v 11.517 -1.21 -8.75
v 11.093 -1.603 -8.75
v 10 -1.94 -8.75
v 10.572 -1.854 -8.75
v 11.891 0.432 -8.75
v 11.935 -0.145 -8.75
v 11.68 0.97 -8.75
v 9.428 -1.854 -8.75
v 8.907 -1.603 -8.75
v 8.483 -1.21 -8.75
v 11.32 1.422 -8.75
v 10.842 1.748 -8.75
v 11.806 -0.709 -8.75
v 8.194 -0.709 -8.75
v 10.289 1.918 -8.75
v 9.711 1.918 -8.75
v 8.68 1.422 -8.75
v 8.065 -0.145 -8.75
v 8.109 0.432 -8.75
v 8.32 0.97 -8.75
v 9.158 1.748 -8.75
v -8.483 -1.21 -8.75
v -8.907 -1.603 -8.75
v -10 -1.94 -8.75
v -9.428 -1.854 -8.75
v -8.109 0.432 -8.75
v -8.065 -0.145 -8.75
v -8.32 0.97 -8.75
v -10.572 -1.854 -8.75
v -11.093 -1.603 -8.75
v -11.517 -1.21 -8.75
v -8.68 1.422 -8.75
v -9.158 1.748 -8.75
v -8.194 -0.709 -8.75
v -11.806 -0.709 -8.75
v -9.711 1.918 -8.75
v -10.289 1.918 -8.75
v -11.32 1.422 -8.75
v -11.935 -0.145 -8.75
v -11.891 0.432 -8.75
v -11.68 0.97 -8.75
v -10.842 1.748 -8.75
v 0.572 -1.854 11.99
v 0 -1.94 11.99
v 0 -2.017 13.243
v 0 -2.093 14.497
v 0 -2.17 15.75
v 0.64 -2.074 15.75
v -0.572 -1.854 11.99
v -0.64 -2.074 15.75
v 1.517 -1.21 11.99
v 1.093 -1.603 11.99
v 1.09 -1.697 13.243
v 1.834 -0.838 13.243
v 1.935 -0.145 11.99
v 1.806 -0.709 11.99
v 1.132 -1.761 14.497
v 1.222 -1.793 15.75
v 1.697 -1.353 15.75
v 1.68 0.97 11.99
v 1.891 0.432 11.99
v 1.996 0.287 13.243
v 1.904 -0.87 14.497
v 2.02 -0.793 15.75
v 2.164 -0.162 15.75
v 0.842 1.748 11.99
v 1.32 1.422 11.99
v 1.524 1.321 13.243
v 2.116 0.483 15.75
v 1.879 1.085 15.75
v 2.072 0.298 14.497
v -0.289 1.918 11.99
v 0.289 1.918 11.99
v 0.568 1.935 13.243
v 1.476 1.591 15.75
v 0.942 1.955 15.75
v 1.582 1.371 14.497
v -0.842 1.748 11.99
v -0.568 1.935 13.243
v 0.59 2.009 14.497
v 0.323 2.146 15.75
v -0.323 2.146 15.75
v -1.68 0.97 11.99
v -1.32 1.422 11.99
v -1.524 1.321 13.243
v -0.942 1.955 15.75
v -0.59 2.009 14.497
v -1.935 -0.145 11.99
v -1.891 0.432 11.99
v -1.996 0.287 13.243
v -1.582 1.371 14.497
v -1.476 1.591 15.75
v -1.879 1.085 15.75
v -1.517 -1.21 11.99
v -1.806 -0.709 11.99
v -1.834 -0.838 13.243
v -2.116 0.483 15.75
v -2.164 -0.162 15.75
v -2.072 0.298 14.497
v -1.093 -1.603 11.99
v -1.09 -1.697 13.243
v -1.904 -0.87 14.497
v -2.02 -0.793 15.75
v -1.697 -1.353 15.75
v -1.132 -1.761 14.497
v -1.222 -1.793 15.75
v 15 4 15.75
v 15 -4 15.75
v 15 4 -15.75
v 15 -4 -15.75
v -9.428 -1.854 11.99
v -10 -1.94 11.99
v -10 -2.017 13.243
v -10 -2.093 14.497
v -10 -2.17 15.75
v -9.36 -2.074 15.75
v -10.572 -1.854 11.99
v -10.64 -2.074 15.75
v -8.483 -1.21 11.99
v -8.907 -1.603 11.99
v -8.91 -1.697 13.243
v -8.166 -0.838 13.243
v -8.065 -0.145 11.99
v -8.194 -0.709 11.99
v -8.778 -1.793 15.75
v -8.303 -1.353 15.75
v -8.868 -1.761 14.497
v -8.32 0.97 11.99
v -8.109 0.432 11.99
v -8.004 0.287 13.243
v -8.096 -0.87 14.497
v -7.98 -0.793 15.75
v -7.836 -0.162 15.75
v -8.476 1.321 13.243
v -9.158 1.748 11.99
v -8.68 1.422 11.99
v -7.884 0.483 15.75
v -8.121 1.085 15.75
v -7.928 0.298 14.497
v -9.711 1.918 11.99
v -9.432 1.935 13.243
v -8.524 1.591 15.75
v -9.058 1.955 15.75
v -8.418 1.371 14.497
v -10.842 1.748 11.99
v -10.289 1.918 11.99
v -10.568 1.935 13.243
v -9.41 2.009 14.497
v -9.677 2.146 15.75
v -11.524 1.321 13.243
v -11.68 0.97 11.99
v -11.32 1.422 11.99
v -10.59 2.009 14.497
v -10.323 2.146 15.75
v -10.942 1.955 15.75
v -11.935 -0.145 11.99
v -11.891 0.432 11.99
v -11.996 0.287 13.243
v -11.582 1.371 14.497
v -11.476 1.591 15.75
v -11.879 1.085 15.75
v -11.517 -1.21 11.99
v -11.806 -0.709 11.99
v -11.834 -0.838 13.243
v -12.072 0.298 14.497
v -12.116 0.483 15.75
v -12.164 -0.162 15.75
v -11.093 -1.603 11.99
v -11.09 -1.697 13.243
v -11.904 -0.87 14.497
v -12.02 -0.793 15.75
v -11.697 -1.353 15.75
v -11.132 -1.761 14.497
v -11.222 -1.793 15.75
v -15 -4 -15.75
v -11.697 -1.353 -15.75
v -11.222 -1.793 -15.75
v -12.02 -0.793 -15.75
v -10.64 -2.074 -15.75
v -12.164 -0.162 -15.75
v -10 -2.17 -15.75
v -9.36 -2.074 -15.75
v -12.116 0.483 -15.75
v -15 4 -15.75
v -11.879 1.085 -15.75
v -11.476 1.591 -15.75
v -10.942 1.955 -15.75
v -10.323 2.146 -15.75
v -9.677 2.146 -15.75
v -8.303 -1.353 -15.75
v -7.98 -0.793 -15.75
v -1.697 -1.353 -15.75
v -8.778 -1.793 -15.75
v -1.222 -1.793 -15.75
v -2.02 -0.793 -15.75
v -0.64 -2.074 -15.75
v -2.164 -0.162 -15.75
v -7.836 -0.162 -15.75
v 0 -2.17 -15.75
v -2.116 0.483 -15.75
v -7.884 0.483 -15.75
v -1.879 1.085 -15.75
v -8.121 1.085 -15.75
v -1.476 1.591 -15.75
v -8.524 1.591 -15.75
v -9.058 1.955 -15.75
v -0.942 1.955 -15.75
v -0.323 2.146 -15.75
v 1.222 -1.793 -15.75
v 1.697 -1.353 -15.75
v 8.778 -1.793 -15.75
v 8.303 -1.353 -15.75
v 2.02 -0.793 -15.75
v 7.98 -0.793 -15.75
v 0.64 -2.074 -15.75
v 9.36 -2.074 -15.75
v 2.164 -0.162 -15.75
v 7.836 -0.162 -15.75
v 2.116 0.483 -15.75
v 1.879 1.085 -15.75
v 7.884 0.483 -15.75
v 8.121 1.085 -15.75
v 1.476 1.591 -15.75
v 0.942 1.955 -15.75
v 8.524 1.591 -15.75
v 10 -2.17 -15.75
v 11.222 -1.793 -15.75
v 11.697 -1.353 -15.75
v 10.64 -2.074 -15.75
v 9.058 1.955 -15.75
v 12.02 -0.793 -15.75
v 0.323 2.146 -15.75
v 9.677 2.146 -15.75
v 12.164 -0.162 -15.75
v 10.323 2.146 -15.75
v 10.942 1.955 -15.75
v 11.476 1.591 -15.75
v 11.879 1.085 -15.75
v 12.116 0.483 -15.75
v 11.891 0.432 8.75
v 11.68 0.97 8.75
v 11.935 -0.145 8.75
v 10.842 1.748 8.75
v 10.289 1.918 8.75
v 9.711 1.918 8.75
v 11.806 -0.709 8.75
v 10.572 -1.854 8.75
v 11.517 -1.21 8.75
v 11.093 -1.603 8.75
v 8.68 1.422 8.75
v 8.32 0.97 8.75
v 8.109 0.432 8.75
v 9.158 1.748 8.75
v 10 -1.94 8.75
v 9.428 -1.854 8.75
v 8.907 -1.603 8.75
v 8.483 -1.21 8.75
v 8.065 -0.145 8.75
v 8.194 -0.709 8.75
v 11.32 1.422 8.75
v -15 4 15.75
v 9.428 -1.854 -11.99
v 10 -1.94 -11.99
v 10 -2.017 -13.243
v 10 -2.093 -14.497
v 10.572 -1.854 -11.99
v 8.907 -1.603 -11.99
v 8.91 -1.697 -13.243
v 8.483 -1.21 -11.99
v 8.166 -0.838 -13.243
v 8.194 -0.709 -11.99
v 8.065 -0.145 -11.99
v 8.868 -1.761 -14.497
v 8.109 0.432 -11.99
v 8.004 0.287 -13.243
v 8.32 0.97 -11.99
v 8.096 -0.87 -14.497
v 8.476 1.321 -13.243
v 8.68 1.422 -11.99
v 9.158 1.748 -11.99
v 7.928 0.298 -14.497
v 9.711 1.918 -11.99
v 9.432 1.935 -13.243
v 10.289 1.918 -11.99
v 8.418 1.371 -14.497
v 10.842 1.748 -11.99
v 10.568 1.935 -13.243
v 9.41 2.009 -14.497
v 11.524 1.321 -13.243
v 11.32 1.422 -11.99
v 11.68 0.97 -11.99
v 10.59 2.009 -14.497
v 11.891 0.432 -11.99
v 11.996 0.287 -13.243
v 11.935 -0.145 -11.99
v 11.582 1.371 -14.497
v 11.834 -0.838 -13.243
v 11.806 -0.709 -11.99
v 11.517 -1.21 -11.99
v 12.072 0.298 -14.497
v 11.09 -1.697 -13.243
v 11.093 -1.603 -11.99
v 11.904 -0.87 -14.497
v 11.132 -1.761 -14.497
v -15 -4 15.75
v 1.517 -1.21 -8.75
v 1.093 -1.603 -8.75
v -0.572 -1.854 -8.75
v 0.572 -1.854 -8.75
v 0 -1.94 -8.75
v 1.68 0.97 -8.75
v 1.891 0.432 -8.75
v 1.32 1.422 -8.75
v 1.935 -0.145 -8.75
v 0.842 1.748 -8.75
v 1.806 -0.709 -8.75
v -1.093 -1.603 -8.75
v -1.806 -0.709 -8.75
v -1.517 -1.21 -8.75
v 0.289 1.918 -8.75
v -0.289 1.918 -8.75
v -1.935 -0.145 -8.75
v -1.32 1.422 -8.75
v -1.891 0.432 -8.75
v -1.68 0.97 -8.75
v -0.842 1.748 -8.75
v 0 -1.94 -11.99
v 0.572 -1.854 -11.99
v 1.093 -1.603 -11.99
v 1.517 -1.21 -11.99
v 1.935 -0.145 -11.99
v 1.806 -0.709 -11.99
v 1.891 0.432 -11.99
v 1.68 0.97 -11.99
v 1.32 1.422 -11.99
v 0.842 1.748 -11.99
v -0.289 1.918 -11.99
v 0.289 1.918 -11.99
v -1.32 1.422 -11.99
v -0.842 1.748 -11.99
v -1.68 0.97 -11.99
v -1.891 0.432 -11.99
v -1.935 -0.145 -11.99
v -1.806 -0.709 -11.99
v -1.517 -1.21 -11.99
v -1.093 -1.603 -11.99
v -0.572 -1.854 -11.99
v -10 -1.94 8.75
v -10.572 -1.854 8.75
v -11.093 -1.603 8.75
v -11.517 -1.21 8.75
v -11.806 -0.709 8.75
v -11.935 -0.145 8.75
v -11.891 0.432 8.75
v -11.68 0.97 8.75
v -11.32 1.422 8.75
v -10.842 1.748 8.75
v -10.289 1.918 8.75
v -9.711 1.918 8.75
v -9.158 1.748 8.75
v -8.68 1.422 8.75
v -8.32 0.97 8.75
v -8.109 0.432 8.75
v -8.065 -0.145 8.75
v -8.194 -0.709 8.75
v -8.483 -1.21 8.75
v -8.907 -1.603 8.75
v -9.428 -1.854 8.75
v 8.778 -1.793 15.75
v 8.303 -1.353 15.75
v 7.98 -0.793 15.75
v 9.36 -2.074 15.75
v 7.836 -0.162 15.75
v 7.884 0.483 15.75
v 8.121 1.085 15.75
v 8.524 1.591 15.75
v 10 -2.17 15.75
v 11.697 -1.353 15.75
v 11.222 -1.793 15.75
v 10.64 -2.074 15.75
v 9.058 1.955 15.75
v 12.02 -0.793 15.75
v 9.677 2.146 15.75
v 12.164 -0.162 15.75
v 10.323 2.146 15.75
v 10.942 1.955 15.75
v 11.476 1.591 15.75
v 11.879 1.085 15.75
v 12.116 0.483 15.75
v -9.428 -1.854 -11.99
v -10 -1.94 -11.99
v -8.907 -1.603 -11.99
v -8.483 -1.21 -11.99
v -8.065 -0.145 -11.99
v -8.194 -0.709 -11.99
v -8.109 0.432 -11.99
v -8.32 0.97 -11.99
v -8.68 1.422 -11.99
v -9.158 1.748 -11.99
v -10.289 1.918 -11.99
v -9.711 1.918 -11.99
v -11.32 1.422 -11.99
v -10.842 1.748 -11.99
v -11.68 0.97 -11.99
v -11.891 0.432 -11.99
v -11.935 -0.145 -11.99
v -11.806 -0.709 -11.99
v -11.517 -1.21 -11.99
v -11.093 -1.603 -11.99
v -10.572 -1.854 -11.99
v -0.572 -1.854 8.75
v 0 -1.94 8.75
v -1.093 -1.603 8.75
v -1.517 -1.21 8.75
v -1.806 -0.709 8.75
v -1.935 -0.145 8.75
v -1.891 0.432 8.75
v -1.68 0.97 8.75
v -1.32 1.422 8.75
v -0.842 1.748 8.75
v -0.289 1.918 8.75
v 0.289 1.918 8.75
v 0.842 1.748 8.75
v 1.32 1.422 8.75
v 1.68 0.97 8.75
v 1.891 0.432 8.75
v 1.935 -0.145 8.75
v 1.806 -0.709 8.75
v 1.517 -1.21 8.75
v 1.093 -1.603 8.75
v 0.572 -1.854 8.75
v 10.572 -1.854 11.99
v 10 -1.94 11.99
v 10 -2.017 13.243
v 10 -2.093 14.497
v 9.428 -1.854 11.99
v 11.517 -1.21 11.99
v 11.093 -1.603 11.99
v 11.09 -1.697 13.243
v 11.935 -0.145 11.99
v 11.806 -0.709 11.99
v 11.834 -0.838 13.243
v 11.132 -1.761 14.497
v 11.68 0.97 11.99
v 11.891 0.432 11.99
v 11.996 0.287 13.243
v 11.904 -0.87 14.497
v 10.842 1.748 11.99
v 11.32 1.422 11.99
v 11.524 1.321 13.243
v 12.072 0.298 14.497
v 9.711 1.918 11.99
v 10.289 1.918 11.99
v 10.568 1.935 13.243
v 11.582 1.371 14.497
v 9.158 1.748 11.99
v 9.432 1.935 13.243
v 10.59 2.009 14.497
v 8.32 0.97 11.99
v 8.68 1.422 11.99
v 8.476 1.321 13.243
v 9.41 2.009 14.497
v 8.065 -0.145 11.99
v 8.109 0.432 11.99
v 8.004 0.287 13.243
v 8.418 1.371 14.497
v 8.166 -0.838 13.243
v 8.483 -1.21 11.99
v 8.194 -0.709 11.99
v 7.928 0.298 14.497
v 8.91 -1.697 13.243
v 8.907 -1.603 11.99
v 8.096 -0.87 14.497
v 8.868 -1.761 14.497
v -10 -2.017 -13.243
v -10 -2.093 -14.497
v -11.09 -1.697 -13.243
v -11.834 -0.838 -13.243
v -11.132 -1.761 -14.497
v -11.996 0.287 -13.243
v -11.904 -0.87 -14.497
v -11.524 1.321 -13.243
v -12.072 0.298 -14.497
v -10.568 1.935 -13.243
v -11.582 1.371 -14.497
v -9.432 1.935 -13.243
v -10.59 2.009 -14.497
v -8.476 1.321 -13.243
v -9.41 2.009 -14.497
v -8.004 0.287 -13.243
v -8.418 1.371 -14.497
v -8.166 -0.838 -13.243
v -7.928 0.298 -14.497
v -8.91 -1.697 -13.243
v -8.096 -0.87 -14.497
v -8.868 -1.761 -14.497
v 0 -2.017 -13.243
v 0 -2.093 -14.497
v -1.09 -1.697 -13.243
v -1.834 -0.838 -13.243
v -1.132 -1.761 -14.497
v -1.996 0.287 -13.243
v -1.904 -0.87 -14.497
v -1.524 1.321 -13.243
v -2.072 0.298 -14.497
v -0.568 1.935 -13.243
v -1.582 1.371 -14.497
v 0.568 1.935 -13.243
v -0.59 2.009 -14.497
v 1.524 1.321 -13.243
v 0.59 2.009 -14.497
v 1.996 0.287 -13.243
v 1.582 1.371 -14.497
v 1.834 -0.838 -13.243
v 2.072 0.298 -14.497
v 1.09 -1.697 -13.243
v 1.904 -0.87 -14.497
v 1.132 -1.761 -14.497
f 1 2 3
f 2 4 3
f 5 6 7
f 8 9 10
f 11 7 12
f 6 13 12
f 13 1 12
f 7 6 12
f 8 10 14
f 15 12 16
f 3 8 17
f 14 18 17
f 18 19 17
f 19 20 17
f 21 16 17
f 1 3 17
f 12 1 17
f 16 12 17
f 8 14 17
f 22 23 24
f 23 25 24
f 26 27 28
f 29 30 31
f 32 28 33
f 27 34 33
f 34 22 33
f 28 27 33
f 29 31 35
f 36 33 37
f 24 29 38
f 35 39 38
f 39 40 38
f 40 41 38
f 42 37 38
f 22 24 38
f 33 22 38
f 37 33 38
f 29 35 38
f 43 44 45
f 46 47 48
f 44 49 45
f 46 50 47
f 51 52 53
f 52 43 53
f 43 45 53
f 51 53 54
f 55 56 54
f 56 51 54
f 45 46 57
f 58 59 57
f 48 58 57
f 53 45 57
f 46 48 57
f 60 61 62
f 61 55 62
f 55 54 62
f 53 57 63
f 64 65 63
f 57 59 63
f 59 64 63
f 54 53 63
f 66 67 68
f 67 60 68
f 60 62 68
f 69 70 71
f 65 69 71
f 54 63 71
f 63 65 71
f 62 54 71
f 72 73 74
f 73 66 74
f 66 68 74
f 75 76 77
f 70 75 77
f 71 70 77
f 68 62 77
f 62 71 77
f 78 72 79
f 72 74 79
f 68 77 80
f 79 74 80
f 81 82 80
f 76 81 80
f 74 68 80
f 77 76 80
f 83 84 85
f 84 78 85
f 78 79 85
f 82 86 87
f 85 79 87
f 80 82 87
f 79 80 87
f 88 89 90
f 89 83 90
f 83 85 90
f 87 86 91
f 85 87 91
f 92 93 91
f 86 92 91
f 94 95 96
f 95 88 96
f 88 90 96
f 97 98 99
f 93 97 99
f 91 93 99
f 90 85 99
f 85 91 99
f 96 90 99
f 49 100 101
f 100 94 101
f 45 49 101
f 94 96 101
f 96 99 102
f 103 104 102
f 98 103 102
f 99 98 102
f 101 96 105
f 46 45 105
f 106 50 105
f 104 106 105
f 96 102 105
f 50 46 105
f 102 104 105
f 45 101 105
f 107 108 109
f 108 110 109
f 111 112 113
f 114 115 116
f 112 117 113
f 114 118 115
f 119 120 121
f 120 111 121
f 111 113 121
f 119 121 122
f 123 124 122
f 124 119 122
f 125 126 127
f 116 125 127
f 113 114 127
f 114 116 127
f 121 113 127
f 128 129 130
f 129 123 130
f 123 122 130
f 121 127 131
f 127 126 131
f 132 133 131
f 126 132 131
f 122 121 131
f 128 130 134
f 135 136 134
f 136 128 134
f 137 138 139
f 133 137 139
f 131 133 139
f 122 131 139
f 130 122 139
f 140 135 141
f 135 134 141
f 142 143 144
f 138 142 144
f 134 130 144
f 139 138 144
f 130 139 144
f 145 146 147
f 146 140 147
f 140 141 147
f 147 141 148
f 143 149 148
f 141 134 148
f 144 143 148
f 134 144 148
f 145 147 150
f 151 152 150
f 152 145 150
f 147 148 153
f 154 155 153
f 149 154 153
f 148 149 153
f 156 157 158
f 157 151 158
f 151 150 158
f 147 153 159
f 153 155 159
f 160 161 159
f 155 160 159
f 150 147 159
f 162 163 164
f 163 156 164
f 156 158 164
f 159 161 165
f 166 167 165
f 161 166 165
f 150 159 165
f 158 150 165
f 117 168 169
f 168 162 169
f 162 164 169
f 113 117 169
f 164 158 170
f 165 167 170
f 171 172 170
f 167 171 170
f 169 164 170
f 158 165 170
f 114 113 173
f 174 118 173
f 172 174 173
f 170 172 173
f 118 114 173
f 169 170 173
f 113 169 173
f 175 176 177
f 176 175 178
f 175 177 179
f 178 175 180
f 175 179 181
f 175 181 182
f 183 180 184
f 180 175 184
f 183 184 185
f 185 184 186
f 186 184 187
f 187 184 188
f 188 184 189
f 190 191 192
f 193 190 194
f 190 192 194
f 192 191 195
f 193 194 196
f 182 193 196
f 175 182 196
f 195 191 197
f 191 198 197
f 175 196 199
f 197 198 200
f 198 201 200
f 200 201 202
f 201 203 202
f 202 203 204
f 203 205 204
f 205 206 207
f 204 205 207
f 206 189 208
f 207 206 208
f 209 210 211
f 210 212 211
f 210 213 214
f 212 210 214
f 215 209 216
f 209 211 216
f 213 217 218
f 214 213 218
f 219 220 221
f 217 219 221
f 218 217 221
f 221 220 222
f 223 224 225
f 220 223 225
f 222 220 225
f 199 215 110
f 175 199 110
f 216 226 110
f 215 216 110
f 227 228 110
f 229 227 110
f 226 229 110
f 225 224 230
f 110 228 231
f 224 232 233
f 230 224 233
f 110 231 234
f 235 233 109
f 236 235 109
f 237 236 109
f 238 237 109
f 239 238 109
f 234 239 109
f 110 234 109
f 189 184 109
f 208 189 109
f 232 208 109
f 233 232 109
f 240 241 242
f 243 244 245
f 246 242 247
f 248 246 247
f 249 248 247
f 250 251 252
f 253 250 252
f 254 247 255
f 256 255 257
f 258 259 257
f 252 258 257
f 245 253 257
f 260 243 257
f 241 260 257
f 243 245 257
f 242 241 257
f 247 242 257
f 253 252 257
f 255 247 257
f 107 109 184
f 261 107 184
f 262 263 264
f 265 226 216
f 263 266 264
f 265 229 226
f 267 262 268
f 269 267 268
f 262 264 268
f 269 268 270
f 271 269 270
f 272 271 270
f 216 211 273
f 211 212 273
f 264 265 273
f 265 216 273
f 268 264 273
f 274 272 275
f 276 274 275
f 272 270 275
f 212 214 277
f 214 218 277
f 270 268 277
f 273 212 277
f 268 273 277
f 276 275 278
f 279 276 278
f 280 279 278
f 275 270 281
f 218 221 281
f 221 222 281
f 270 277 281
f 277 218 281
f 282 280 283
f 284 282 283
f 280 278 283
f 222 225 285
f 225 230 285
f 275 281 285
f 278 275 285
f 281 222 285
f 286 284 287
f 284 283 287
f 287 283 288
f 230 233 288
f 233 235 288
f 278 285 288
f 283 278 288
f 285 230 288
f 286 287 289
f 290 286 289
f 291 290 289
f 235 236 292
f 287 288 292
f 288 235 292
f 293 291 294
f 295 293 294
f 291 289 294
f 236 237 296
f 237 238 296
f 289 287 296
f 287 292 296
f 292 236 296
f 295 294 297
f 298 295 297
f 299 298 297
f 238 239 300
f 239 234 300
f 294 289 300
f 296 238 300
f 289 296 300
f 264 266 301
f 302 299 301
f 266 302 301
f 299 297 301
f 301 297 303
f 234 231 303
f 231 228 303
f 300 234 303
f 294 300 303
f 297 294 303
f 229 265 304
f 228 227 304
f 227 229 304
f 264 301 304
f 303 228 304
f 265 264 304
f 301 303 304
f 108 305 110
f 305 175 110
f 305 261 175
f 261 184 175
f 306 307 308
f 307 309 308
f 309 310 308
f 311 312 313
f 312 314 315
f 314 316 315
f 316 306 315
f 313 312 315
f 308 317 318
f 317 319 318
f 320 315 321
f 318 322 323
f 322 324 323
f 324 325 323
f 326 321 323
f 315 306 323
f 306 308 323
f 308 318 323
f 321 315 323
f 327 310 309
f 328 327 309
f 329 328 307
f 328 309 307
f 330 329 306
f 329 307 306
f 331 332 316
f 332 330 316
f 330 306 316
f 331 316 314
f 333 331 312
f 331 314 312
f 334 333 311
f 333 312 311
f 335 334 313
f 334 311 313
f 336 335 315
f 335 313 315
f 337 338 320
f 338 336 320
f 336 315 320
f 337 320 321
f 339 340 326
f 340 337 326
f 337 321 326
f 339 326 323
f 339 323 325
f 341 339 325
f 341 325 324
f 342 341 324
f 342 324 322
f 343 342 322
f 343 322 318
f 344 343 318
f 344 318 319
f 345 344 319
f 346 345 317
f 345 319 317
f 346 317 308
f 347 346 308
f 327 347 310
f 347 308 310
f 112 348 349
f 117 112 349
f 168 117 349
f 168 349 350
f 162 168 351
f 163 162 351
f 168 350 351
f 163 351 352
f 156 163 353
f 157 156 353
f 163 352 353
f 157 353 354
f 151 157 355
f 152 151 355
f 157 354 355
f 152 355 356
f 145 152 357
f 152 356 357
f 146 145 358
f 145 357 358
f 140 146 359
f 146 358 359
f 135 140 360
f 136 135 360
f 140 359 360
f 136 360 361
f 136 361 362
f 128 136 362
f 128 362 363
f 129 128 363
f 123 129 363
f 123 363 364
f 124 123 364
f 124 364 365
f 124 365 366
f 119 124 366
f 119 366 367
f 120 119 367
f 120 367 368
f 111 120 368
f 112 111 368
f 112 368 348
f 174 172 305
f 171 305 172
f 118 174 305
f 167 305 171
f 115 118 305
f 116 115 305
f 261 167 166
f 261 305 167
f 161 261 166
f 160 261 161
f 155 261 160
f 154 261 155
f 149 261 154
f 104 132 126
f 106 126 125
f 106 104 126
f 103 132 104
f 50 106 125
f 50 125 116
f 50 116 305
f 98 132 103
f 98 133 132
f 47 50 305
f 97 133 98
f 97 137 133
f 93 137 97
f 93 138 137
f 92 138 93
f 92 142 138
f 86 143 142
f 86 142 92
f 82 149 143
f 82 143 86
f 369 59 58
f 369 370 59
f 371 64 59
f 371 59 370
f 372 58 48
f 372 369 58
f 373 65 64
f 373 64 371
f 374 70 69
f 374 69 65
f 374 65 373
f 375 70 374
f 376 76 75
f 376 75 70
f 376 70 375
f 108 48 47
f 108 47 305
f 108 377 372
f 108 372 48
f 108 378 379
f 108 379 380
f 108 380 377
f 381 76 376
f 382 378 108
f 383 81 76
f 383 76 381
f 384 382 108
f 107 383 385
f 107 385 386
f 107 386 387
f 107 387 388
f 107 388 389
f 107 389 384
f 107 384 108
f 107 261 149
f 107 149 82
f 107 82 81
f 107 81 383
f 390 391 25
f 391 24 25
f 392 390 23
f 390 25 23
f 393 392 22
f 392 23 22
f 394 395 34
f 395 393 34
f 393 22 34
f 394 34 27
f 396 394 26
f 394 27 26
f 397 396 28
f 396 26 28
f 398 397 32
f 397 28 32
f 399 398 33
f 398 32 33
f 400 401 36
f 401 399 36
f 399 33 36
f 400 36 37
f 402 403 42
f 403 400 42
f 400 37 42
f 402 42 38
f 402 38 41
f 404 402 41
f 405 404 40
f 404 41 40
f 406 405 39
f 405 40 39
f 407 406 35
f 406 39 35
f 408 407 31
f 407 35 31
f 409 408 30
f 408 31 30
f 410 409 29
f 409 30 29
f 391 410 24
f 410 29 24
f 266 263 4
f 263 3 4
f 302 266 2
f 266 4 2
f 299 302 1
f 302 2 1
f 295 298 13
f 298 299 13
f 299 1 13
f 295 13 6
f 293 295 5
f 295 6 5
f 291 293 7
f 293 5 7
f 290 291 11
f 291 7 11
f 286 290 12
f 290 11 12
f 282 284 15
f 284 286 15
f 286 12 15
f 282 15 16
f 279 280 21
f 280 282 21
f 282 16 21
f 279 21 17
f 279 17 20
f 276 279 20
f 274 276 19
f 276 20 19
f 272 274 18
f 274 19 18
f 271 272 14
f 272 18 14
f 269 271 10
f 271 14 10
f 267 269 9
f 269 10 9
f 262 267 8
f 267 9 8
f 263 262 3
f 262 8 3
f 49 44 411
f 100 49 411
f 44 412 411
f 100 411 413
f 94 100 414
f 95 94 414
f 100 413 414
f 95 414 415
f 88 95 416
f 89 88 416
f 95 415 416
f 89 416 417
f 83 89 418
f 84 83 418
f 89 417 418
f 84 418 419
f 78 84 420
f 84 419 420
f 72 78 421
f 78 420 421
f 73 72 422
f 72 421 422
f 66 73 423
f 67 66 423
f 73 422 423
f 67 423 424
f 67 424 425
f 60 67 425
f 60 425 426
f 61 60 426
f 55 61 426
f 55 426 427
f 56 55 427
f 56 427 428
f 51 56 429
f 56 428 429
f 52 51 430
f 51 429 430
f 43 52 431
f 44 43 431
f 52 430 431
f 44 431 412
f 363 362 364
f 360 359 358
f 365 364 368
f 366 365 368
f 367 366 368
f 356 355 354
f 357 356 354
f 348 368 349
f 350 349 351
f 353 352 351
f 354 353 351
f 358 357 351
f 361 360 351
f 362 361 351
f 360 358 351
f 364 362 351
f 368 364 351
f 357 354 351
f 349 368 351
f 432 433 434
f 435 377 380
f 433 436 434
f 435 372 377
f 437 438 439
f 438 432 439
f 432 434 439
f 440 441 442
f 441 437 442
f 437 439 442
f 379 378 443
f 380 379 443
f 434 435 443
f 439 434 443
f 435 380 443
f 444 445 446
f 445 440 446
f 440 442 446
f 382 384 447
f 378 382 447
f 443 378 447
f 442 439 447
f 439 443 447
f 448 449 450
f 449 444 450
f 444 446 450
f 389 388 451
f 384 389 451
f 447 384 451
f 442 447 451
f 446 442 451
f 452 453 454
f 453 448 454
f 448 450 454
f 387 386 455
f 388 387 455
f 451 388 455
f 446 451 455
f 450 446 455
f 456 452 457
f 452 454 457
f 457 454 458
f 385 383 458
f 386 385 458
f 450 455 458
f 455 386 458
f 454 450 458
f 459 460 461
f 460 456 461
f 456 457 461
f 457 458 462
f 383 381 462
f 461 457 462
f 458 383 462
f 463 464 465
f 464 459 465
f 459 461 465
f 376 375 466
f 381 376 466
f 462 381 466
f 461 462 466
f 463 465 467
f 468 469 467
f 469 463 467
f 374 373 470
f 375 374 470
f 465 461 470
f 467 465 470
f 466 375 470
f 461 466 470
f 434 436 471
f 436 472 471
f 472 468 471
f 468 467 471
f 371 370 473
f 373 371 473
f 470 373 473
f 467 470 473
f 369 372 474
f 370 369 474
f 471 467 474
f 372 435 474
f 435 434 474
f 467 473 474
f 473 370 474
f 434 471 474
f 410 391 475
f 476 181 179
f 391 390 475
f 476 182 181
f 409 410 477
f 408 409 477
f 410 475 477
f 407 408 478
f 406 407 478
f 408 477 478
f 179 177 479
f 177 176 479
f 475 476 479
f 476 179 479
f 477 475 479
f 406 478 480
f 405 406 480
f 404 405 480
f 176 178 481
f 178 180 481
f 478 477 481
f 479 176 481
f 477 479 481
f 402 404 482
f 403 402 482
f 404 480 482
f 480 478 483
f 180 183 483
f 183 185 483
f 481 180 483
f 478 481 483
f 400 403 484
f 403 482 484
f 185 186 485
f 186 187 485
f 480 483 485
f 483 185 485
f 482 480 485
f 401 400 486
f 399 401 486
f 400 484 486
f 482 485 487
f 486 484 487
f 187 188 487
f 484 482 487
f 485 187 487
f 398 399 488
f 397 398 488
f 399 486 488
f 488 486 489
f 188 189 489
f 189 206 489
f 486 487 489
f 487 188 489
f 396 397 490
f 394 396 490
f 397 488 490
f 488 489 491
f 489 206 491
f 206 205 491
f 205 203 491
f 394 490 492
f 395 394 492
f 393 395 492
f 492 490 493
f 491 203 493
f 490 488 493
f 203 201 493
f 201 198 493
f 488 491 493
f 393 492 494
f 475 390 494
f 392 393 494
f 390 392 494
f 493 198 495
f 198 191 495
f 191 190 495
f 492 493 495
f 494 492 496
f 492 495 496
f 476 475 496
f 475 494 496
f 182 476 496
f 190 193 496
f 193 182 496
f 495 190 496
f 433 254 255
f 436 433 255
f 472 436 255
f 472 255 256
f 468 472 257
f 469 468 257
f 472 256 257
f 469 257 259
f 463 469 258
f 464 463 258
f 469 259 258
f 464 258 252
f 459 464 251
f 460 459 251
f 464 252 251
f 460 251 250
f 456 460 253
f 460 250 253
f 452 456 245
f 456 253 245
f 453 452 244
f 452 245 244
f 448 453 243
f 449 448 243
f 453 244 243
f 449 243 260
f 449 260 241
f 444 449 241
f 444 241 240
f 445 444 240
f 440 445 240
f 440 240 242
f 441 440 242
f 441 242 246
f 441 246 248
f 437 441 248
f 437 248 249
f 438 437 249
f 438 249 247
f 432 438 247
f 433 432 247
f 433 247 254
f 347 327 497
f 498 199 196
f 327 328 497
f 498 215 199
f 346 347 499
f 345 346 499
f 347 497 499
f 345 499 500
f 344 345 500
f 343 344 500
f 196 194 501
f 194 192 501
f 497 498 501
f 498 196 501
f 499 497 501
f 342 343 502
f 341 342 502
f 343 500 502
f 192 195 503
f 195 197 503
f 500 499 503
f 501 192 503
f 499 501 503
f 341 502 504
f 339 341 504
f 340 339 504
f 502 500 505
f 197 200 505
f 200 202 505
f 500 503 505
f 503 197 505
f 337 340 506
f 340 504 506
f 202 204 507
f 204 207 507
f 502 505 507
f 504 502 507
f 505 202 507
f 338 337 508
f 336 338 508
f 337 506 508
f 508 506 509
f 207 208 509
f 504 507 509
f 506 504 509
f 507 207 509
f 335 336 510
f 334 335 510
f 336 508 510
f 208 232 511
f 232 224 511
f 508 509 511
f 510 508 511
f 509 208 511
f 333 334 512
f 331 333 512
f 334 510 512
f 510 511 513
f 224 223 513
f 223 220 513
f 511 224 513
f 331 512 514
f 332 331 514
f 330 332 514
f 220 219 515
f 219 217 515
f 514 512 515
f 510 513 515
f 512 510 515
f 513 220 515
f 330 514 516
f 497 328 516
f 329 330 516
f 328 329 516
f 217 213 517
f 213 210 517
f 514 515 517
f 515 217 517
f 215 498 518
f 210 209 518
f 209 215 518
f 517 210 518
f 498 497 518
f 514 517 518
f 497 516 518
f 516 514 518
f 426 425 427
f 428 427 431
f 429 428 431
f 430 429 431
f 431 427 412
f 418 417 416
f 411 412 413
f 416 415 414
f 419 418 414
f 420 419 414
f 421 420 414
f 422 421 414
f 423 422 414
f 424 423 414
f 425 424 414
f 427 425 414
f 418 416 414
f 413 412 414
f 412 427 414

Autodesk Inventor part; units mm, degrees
ref_plane "YZ Plane" through (0, 0, 0) normal (1, 0, 0) x (0, 1, 0)
ref_plane "XZ Plane" through (0, 0, 0) normal (0, 1, 0) x (-1, 0, 0)
ref_plane "XY Plane" through (0, 0, 0) normal (0, 0, 1) x (1, 0, 0)
sketch "Sketch1" plane through (0, 0, 0) normal (0, 0, 1) x (1, 0, 0)
  line L0 (-15, -4) -> (15, -4)
  line L1 (15, -4) -> (15, 4)
  line L2 (15, 4) -> (-15, 4)
  line L3 (-15, 4) -> (-15, -4)
  line L4 (-15, -4) -> (15, 4) construction
  line L5 (15, -4) -> (-15, 4) construction
  point P0 (0, 0)
  dimension "d0" = 8
  dimension "d1" = 30
extrude "Extrusion1" add sketch "Sketch1" along normal blind 15.75 and the other way blind 15.75
sketch "Sketch2" plane through (0, 0, 15.75) normal (0, 0, 1) x (1, 0, 0)
  circle A0 centre (0, 0) radius 1.5
  dimension "d4" = 3
hole "Hole1" at (0, 0, 15.75) direction (0, 0, -1) diameter 3.88 depth 7 countersink diameter 4.34 countersink angle 7
pattern_linear "Rectangular Pattern1" count 2 spacing 10 along (-1, 0, 0) count 2 spacing 10 along (1, 0, 0) of "Hole1"
mirror "Mirror1" about plane through (0, 0, 0) normal (0, 0, 1) of "Hole1", "Rectangular Pattern1"
properties part number "cycloid_base_bottom"
